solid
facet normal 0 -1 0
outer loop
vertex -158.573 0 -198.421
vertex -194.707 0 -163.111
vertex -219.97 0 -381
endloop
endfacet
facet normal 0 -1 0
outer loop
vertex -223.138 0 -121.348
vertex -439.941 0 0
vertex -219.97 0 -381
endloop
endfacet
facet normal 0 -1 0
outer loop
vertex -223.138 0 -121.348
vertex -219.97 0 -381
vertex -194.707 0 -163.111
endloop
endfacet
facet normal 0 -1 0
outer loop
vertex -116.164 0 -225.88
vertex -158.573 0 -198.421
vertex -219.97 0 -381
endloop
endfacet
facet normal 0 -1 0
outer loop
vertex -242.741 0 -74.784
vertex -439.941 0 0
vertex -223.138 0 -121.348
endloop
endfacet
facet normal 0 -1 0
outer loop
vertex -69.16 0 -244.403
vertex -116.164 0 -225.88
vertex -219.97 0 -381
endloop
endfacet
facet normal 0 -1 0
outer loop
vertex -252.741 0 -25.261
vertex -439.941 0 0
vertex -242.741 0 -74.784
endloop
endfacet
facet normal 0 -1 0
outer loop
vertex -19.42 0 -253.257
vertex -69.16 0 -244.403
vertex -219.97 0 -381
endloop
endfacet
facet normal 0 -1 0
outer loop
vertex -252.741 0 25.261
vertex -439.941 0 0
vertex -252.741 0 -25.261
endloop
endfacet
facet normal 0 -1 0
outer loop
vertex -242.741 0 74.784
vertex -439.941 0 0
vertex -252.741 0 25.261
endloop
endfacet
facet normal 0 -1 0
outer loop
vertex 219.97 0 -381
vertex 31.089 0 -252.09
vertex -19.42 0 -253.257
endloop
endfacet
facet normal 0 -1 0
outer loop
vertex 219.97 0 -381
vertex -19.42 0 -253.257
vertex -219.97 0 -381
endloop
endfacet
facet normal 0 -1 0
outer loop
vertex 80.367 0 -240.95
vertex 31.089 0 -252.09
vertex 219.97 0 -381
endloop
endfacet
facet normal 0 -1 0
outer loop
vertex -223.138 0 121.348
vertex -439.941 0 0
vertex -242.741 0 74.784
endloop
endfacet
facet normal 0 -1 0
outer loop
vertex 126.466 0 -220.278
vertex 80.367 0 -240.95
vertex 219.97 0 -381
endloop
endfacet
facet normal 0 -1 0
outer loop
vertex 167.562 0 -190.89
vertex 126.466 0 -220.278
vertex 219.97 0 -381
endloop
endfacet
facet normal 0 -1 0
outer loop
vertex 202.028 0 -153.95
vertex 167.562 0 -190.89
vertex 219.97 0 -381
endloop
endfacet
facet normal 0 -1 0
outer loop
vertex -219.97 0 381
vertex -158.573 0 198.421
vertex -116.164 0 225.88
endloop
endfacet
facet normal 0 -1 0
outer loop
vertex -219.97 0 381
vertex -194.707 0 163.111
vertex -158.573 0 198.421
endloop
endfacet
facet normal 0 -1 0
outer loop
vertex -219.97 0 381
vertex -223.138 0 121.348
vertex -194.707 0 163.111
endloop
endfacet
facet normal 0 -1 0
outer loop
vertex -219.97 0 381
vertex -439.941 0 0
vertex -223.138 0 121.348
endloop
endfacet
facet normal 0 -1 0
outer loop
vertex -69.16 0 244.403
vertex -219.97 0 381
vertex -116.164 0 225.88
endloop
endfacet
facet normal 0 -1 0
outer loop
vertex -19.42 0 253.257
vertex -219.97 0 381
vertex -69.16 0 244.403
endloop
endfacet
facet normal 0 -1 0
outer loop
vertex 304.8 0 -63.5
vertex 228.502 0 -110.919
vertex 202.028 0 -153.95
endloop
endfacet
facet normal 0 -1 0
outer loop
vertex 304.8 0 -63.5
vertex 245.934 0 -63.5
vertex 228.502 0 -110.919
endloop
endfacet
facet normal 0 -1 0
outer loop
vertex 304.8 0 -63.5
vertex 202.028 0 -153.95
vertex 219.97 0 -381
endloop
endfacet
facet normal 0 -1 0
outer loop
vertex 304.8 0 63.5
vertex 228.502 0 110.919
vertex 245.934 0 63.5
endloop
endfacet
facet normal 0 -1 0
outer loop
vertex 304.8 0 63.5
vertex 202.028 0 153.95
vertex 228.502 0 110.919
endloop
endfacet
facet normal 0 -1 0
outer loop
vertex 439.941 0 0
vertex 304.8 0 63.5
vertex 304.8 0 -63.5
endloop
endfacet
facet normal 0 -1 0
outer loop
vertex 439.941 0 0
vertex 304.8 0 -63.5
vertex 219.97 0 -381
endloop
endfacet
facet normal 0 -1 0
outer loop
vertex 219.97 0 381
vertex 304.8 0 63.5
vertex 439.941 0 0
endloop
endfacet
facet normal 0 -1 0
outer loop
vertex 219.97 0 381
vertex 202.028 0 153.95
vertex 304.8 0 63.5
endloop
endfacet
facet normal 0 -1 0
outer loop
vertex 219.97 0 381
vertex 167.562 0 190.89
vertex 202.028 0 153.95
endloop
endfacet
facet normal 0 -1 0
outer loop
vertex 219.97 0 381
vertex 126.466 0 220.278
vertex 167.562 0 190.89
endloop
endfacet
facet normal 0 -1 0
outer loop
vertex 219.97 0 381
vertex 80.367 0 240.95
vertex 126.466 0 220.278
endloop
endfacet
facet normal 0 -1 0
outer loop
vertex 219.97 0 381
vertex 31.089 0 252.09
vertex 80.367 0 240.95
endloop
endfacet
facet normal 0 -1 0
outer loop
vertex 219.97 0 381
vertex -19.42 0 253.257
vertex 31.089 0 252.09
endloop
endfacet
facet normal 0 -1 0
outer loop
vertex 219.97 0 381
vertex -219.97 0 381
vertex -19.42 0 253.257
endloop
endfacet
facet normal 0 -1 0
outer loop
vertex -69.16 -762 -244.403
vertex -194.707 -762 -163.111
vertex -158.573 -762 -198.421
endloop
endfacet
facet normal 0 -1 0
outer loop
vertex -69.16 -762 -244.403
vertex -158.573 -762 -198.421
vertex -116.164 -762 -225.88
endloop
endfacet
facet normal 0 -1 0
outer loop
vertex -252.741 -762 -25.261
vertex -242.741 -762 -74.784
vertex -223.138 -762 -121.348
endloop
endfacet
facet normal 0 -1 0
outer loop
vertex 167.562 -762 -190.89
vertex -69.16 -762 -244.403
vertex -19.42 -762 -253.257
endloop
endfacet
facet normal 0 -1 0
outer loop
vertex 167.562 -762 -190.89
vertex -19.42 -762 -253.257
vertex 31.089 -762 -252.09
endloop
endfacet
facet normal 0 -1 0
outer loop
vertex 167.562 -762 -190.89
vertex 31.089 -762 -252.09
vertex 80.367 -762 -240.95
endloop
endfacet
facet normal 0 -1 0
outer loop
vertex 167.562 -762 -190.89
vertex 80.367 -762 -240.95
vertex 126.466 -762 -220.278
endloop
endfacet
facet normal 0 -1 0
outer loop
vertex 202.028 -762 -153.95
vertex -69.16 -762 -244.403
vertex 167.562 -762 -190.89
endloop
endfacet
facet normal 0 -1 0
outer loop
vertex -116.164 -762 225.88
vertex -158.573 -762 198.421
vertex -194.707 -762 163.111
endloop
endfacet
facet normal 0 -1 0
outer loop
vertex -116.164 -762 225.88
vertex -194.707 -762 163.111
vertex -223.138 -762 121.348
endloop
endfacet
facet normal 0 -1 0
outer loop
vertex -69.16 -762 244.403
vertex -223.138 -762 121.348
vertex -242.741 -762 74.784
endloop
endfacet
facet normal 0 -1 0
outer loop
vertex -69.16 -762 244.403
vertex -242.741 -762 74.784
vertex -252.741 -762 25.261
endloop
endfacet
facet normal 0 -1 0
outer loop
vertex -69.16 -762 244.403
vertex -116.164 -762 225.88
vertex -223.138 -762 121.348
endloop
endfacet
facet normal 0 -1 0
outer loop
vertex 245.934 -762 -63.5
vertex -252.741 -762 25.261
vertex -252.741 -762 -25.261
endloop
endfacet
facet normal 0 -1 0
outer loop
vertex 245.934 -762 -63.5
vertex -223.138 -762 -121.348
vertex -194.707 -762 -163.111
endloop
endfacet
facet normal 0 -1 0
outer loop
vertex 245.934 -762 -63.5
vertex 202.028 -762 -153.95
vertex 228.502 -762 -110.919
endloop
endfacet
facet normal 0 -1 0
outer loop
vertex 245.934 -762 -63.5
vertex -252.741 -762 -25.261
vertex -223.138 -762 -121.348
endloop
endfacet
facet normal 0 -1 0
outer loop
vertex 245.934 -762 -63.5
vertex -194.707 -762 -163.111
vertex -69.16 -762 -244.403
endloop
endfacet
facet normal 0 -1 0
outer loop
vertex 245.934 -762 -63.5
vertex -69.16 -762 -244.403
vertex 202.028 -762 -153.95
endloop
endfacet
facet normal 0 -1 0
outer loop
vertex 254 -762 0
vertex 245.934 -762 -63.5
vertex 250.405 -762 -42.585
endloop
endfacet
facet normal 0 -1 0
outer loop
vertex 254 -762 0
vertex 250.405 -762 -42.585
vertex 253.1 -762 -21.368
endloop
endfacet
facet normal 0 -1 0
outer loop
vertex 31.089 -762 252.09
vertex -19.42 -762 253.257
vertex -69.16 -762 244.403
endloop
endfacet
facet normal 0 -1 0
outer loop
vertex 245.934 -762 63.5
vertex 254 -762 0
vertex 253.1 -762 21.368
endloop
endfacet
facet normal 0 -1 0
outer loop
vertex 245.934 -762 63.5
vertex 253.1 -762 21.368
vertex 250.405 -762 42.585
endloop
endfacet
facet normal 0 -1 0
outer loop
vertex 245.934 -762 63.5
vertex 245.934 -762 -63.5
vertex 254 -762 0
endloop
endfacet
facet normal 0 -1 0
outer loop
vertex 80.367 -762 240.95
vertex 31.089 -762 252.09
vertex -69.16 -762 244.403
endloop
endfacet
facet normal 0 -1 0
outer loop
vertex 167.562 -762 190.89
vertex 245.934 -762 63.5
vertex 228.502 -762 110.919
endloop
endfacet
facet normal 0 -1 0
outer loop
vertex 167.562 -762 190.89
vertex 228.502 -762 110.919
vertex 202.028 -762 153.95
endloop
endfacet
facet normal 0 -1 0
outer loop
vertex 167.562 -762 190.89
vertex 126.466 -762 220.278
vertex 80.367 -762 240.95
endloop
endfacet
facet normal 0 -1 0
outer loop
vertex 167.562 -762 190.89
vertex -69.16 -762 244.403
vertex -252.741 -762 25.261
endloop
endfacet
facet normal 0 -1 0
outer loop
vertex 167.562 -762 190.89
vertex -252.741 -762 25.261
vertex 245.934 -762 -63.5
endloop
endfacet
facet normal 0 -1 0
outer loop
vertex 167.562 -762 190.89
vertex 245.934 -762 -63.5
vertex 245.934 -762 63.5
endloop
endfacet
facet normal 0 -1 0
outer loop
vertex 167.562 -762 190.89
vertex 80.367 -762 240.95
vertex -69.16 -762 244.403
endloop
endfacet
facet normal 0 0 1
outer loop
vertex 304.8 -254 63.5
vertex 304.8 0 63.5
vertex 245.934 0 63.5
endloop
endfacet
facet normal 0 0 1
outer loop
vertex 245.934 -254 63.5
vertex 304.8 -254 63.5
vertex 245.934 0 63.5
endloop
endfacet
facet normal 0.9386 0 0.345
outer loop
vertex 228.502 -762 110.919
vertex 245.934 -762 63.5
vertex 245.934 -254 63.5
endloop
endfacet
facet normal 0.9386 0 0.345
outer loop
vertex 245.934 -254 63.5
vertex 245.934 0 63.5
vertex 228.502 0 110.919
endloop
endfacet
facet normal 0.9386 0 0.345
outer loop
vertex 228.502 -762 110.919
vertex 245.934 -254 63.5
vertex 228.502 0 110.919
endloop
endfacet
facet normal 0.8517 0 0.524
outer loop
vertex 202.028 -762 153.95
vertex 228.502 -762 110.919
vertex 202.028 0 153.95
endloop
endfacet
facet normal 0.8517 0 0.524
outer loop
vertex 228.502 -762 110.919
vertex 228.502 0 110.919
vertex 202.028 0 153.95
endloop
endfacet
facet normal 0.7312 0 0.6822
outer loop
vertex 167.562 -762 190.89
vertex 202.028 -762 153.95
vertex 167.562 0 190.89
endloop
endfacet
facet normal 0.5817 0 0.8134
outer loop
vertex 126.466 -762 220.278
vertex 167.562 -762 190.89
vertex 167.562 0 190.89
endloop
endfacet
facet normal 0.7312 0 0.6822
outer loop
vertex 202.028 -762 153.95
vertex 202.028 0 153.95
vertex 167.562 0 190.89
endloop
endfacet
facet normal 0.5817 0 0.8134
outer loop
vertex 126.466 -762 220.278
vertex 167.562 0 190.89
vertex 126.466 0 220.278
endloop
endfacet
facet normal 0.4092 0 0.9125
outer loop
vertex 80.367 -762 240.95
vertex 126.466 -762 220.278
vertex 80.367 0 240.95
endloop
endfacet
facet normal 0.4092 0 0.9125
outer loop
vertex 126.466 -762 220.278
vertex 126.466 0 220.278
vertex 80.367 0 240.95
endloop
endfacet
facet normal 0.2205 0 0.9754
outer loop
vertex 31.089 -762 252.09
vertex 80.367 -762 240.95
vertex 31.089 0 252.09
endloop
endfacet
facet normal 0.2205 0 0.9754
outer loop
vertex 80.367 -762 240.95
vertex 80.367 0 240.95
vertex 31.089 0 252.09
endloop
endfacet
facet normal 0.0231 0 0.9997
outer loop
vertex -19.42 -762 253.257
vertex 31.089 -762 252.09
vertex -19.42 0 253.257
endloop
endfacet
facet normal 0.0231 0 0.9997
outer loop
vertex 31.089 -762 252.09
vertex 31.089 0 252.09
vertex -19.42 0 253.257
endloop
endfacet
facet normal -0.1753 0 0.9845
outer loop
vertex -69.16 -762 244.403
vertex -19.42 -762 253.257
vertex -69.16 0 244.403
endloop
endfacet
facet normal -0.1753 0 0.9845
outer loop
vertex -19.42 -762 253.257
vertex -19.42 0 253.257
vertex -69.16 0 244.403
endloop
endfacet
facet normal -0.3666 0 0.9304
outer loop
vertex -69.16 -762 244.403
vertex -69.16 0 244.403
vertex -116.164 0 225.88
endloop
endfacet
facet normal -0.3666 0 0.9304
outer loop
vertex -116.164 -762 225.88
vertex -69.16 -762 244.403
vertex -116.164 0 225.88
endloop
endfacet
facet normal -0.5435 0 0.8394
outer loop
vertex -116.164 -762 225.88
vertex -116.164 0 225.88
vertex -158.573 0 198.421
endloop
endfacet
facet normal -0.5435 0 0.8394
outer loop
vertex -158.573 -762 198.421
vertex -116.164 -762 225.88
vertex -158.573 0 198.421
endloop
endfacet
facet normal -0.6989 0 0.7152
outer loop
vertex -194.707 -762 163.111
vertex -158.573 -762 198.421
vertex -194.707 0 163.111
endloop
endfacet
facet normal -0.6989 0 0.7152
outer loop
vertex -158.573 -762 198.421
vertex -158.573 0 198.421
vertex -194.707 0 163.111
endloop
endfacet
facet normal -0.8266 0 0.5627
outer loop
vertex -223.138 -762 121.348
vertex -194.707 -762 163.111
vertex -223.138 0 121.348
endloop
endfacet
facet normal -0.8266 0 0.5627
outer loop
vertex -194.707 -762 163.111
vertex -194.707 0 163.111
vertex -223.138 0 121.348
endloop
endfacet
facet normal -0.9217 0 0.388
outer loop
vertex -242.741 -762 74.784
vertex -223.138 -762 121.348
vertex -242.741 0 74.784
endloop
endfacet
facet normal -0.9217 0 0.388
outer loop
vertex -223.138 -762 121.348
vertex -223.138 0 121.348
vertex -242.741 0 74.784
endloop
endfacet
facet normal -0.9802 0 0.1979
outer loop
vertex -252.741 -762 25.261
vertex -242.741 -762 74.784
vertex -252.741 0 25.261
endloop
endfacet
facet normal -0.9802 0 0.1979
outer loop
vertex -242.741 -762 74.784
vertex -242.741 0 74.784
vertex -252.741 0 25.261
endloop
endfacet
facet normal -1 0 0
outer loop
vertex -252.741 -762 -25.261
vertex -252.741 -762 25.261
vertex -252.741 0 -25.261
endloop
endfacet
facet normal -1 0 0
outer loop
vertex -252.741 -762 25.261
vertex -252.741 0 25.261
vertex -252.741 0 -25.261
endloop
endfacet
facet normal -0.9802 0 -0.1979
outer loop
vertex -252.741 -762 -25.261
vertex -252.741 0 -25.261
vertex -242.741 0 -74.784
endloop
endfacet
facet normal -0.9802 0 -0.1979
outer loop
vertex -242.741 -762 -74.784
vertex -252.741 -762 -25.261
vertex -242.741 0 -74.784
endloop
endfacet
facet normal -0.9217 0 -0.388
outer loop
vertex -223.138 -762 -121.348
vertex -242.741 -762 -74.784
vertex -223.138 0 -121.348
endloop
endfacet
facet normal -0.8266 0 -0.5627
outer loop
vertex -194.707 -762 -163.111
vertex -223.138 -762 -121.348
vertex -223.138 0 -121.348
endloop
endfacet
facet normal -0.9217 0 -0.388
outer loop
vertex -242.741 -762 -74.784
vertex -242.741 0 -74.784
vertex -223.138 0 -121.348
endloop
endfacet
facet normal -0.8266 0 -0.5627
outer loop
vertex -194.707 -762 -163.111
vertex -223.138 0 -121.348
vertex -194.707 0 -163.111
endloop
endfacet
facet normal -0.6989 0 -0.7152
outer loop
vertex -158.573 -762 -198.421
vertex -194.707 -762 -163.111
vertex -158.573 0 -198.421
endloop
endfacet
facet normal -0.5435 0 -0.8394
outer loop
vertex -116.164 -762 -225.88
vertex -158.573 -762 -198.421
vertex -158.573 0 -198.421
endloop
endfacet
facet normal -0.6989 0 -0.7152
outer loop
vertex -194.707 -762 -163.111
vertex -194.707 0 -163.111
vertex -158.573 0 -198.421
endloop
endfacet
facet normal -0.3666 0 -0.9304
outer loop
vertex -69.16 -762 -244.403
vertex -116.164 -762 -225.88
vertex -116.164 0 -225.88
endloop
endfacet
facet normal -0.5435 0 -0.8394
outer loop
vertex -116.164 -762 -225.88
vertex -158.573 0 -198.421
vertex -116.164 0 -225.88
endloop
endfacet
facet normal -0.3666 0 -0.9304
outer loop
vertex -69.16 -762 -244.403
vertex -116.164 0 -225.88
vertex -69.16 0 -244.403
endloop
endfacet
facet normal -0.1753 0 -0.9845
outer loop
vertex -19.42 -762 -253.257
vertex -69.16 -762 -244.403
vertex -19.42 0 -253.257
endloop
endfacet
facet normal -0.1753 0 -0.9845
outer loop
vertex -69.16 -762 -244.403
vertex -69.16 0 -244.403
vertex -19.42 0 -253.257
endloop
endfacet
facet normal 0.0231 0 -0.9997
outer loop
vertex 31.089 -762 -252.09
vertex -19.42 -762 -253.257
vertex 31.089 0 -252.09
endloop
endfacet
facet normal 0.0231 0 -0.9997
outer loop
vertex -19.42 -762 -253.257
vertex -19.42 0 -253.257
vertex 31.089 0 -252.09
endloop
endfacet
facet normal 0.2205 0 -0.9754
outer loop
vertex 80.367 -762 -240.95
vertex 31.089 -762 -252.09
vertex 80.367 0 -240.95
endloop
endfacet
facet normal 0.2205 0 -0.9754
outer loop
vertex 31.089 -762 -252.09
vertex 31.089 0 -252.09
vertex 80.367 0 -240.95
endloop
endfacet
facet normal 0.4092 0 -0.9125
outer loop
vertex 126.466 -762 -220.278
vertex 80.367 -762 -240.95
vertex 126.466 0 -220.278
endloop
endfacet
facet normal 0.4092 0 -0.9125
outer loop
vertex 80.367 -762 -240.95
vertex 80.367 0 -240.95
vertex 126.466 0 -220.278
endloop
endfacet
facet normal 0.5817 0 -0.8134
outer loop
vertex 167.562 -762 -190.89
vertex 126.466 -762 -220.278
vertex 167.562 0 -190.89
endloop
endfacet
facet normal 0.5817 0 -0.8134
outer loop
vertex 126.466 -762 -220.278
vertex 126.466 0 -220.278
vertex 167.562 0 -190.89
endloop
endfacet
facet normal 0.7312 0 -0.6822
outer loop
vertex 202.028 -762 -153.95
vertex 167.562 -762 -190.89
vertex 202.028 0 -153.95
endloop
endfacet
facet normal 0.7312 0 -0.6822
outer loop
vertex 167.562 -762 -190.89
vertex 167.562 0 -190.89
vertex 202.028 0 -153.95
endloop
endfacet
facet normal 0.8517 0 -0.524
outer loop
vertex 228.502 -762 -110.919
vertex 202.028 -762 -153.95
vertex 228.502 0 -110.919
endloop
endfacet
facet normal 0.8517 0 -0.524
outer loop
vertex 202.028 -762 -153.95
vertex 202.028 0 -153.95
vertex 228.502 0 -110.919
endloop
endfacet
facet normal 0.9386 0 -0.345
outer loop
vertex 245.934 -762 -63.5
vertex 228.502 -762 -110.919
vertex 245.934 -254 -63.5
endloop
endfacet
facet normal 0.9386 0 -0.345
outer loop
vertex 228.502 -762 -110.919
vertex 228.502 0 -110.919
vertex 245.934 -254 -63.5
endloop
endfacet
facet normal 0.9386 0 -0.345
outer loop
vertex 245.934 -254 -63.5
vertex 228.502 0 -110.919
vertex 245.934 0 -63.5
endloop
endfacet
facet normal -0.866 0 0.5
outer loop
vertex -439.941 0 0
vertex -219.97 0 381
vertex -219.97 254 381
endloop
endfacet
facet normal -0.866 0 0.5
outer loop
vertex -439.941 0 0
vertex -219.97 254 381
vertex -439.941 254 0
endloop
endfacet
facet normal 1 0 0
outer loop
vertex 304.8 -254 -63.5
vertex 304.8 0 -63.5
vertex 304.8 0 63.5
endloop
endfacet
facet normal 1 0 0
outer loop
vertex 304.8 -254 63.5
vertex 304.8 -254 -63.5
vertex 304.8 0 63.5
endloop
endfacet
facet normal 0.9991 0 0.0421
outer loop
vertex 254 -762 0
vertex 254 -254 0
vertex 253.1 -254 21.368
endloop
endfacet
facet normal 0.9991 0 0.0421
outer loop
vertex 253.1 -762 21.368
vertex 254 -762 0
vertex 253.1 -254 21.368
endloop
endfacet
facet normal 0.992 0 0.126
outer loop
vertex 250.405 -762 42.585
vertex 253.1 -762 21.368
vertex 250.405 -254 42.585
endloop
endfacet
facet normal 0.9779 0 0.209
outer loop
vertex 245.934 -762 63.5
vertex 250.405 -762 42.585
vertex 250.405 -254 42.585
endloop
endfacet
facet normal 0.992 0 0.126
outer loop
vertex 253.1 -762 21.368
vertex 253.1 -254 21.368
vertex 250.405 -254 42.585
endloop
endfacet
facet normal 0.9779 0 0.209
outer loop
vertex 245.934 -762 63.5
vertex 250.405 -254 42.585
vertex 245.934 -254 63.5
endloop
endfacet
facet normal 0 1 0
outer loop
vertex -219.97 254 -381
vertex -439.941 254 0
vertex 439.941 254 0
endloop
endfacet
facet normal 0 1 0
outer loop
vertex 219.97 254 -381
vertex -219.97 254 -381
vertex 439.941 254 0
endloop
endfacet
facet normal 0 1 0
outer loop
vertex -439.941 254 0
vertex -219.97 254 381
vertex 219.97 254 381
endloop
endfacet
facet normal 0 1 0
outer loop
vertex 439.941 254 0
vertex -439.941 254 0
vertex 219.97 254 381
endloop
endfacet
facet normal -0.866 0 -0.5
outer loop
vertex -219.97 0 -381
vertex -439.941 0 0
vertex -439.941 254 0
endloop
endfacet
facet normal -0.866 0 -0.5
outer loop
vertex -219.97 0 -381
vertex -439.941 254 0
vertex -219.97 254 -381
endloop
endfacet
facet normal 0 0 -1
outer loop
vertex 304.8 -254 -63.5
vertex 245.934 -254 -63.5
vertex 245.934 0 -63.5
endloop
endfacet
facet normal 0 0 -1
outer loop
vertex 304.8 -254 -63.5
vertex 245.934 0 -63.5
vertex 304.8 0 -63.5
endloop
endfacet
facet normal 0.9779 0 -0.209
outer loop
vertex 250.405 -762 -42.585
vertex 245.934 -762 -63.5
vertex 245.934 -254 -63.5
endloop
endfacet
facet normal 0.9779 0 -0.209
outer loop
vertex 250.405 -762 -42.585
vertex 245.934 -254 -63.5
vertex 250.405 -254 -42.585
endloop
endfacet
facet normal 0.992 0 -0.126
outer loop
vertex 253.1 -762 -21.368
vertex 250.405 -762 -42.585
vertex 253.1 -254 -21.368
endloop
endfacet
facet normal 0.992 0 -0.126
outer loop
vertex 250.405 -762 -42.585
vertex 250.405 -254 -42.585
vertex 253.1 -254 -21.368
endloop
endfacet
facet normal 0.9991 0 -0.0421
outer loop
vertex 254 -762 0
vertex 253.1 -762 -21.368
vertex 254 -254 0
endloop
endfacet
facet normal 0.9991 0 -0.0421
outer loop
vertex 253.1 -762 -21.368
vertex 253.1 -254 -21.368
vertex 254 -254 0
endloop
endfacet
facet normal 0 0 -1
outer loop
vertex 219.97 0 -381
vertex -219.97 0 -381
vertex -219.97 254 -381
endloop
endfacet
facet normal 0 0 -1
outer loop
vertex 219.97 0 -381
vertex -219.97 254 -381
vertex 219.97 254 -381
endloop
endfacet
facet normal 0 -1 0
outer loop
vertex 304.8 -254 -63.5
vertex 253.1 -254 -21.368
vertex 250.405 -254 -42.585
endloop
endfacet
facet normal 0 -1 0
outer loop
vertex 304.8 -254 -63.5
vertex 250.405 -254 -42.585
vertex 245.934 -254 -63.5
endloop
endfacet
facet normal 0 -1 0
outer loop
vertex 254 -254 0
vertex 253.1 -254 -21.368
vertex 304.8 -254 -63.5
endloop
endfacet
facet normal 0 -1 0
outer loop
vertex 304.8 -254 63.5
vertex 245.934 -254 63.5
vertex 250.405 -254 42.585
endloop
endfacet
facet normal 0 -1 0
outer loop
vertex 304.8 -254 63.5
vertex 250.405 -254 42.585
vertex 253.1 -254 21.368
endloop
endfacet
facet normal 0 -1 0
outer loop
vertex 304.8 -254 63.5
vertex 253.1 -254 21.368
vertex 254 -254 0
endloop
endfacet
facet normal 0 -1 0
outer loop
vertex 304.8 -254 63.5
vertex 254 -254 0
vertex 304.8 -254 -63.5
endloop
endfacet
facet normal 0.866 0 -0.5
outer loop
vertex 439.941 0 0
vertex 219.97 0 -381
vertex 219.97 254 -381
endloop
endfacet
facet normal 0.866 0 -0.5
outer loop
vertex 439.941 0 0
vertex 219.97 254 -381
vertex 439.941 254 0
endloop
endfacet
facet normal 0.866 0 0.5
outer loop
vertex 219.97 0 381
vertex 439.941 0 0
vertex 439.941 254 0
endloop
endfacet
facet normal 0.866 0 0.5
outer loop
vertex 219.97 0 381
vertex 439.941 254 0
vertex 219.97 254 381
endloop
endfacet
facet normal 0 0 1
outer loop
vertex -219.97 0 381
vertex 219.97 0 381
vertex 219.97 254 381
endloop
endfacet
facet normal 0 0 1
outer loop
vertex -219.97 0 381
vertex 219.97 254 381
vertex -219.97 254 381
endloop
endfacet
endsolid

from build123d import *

# Parameters (mm, degrees)
F1_DEPTH = 762
F2_DEPTH = 254
F4_DEPTH = 254


with BuildPart() as f1:
    # F0 (on Front) → F1 (new body)
    with BuildSketch(Plane.XZ):
        with BuildLine():
            ThreePointArc((254, 0), (251.975543, 32.00509), (245.934442, 63.5))
            ThreePointArc((245.934442, 63.5), (-254, 0), (245.934442, -63.5))
            ThreePointArc((245.934442, -63.5), (251.975543, -32.00509), (254, 0))
        make_face()
    extrude(amount=F1_DEPTH)

    # F0 (on Front) → F2 (join)
    with BuildSketch(Plane.XZ):
        with BuildLine():
            Line((304.8, 63.5), (245.934442, 63.5))
            ThreePointArc((245.934442, 63.5), (251.975543, 32.00509), (254, 0))
            ThreePointArc((254, 0), (251.975543, -32.00509), (245.934442, -63.5))
            Line((245.934442, -63.5), (304.8, -63.5))
            Line((304.8, -63.5), (304.8, 63.5))
        make_face()
    extrude(amount=F2_DEPTH)

    # F3 (on face) + F0 (on Front) → F4 (join)
    with BuildSketch(Plane.XZ):
        Polygon((219.970453, 381), (-219.970453, 381), (-439.940905, 0), (-219.970453, -381), (219.970453, -381), (439.940905, 0), align=None)
    with BuildSketch(Plane.XZ):
        Polygon((219.970453, 381), (-219.970453, 381), (-439.940905, 0), (-219.970453, -381), (219.970453, -381), (439.940905, 0), align=None)
        with BuildLine():
            ThreePointArc((245.934442, -63.5), (-254, 0), (245.934442, 63.5))
            Line((245.934442, 63.5), (304.8, 63.5))
            Line((304.8, 63.5), (304.8, -63.5))
            Line((304.8, -63.5), (245.934442, -63.5))
        make_face(mode=Mode.SUBTRACT)
    extrude(amount=-F4_DEPTH)


solid = f1.part
